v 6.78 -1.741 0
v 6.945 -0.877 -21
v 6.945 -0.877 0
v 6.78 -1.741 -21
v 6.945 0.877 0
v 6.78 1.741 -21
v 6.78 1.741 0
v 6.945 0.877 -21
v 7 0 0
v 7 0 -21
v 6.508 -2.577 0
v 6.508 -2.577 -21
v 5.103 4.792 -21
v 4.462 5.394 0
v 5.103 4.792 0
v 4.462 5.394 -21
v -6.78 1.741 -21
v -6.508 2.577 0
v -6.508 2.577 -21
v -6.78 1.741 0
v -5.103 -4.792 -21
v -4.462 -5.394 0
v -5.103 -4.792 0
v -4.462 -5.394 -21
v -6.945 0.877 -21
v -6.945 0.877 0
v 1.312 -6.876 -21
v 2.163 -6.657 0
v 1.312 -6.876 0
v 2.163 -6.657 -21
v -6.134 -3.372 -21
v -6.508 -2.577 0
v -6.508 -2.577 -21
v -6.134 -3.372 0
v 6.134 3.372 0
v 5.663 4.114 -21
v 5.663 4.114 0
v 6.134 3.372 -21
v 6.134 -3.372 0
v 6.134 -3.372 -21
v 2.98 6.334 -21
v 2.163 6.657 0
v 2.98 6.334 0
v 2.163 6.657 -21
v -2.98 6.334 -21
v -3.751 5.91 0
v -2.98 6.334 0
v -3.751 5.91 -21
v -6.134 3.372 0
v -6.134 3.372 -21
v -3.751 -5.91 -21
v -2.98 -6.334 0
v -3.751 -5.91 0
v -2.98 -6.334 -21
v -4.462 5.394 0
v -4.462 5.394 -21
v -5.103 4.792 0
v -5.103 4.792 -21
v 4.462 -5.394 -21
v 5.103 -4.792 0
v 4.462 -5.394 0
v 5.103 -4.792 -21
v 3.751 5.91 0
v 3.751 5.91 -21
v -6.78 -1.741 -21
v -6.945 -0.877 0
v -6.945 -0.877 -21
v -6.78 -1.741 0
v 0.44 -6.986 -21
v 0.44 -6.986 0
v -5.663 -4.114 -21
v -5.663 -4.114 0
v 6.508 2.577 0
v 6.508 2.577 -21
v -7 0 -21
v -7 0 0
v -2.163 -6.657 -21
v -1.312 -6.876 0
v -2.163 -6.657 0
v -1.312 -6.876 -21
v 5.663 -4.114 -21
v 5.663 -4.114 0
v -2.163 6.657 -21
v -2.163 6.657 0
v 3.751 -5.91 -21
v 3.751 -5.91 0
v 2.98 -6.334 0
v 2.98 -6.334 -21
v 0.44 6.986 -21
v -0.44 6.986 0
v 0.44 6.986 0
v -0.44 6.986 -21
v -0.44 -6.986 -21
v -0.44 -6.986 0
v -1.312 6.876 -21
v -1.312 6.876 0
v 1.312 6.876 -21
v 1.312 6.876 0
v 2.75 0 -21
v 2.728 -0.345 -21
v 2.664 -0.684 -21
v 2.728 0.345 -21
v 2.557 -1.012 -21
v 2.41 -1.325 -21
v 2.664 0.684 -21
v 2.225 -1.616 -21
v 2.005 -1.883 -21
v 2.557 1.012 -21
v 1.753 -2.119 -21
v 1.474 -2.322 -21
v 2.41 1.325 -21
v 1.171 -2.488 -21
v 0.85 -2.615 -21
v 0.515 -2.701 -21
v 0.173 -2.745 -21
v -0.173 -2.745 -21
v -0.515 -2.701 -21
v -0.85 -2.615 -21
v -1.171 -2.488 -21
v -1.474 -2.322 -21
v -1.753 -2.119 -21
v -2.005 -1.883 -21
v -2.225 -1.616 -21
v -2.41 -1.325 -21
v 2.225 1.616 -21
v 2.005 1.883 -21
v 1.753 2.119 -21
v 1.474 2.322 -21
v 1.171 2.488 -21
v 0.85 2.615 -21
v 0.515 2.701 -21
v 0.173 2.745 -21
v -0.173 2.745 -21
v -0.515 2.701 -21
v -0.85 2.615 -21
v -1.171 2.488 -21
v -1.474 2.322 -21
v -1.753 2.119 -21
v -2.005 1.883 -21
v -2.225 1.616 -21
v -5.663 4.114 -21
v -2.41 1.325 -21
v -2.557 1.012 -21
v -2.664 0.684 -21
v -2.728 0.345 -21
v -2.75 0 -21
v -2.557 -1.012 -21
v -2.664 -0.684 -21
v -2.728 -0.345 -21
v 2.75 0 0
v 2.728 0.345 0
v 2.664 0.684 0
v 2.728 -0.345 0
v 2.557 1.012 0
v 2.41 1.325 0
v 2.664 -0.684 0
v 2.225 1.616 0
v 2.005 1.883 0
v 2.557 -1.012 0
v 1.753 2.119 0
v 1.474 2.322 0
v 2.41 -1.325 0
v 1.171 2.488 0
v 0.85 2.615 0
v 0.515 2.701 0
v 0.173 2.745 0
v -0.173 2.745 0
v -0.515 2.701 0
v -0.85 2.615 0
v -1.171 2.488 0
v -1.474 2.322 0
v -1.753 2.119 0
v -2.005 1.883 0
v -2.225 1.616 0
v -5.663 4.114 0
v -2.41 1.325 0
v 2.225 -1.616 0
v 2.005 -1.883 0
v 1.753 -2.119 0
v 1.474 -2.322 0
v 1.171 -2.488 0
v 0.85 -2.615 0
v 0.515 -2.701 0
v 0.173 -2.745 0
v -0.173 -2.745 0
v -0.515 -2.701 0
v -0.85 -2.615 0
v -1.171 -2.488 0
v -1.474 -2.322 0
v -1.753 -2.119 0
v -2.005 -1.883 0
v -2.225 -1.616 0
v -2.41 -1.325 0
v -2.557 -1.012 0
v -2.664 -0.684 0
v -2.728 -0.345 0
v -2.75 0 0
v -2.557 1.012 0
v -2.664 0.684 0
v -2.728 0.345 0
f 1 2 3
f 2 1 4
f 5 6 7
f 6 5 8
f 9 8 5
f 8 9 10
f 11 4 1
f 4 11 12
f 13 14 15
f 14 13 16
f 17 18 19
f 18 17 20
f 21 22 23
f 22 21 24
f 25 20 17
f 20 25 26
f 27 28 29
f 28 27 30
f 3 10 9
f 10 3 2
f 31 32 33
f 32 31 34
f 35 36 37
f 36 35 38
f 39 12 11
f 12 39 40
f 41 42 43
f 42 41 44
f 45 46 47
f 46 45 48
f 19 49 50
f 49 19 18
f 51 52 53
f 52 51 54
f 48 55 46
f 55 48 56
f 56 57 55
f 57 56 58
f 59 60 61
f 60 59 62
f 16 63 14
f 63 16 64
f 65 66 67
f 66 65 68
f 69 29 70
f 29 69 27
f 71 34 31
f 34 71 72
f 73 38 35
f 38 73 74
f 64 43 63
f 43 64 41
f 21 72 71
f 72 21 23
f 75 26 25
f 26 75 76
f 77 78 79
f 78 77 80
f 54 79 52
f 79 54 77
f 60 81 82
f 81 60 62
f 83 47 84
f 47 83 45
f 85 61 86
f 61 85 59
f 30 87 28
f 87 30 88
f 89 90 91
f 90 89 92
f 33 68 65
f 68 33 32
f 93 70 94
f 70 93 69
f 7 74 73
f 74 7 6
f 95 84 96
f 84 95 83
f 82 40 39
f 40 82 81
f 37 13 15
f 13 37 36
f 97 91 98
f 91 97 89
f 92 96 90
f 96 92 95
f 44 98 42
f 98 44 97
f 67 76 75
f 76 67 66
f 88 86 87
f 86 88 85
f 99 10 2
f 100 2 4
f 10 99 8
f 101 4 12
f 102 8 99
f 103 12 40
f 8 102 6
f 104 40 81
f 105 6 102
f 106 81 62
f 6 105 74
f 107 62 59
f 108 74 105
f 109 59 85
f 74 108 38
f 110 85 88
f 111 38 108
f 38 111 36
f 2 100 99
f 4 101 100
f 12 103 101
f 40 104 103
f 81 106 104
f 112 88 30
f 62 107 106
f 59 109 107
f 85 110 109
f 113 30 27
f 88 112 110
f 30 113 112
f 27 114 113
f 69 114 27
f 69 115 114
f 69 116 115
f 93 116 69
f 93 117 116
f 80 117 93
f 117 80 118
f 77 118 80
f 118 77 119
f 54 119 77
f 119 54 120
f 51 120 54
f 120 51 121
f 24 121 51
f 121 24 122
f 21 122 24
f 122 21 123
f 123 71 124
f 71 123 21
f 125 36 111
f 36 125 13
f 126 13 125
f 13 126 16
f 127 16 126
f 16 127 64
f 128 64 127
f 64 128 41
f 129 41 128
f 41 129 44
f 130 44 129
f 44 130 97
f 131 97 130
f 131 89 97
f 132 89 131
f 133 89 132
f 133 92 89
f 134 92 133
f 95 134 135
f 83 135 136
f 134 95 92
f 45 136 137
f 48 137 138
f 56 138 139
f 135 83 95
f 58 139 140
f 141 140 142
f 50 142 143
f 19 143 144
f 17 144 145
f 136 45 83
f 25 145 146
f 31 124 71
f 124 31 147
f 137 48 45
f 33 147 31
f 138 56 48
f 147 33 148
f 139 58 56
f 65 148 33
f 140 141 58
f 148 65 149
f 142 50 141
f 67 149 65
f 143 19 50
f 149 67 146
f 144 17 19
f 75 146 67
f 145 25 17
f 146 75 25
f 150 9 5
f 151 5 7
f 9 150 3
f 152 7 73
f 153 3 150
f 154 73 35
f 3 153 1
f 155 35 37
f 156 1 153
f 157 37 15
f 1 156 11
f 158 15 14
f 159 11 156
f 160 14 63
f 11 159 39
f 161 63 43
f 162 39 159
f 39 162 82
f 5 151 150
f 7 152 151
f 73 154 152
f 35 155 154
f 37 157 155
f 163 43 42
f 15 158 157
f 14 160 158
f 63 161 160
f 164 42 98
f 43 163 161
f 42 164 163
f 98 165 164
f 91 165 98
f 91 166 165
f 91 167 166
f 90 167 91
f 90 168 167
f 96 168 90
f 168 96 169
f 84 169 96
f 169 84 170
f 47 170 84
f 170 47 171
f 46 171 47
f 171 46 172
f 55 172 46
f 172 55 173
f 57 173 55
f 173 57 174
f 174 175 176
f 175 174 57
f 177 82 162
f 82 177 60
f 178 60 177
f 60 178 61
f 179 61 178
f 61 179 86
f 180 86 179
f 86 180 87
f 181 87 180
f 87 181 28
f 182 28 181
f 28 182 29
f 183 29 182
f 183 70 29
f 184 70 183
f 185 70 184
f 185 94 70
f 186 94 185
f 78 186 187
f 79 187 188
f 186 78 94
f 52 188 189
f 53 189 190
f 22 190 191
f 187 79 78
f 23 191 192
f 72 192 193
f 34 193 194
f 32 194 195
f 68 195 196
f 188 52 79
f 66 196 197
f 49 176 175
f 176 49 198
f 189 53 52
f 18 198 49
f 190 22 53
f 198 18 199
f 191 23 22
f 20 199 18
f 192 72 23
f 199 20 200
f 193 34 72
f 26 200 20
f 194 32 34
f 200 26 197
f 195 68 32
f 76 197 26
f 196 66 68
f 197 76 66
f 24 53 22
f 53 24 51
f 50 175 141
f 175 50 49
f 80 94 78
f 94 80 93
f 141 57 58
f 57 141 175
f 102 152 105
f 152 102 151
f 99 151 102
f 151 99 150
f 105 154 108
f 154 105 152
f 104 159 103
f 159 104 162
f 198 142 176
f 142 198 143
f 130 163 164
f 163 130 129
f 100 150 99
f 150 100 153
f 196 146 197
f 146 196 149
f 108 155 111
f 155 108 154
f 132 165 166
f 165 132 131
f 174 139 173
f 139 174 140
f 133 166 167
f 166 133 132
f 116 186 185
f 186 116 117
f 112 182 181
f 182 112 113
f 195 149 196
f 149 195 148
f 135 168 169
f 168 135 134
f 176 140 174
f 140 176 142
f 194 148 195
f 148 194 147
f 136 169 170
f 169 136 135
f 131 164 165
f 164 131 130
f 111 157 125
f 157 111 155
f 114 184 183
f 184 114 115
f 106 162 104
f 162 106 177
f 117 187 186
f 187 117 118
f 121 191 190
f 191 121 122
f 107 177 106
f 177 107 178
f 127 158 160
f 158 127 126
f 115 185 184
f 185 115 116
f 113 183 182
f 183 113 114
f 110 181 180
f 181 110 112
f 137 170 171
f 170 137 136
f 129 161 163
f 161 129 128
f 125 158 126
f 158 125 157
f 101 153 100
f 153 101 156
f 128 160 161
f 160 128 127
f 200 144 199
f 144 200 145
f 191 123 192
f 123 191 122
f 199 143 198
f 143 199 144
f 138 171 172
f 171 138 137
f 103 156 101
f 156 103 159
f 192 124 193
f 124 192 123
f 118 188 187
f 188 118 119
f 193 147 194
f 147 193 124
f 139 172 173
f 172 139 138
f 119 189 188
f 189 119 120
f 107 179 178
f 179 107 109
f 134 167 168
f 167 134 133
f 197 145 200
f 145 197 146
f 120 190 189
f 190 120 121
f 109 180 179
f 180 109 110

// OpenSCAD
$fn = 50;


difference() {
	union() {
		translate(v = [0, 0, -21.0000000000]) {
			cylinder(h = 21, r = 7.0000000000);
		}
	}
	union() {
		#translate(v = [0, 0, -21]) {
			cylinder(h = 21, r = 2.7500000000);
		}
	}
}
